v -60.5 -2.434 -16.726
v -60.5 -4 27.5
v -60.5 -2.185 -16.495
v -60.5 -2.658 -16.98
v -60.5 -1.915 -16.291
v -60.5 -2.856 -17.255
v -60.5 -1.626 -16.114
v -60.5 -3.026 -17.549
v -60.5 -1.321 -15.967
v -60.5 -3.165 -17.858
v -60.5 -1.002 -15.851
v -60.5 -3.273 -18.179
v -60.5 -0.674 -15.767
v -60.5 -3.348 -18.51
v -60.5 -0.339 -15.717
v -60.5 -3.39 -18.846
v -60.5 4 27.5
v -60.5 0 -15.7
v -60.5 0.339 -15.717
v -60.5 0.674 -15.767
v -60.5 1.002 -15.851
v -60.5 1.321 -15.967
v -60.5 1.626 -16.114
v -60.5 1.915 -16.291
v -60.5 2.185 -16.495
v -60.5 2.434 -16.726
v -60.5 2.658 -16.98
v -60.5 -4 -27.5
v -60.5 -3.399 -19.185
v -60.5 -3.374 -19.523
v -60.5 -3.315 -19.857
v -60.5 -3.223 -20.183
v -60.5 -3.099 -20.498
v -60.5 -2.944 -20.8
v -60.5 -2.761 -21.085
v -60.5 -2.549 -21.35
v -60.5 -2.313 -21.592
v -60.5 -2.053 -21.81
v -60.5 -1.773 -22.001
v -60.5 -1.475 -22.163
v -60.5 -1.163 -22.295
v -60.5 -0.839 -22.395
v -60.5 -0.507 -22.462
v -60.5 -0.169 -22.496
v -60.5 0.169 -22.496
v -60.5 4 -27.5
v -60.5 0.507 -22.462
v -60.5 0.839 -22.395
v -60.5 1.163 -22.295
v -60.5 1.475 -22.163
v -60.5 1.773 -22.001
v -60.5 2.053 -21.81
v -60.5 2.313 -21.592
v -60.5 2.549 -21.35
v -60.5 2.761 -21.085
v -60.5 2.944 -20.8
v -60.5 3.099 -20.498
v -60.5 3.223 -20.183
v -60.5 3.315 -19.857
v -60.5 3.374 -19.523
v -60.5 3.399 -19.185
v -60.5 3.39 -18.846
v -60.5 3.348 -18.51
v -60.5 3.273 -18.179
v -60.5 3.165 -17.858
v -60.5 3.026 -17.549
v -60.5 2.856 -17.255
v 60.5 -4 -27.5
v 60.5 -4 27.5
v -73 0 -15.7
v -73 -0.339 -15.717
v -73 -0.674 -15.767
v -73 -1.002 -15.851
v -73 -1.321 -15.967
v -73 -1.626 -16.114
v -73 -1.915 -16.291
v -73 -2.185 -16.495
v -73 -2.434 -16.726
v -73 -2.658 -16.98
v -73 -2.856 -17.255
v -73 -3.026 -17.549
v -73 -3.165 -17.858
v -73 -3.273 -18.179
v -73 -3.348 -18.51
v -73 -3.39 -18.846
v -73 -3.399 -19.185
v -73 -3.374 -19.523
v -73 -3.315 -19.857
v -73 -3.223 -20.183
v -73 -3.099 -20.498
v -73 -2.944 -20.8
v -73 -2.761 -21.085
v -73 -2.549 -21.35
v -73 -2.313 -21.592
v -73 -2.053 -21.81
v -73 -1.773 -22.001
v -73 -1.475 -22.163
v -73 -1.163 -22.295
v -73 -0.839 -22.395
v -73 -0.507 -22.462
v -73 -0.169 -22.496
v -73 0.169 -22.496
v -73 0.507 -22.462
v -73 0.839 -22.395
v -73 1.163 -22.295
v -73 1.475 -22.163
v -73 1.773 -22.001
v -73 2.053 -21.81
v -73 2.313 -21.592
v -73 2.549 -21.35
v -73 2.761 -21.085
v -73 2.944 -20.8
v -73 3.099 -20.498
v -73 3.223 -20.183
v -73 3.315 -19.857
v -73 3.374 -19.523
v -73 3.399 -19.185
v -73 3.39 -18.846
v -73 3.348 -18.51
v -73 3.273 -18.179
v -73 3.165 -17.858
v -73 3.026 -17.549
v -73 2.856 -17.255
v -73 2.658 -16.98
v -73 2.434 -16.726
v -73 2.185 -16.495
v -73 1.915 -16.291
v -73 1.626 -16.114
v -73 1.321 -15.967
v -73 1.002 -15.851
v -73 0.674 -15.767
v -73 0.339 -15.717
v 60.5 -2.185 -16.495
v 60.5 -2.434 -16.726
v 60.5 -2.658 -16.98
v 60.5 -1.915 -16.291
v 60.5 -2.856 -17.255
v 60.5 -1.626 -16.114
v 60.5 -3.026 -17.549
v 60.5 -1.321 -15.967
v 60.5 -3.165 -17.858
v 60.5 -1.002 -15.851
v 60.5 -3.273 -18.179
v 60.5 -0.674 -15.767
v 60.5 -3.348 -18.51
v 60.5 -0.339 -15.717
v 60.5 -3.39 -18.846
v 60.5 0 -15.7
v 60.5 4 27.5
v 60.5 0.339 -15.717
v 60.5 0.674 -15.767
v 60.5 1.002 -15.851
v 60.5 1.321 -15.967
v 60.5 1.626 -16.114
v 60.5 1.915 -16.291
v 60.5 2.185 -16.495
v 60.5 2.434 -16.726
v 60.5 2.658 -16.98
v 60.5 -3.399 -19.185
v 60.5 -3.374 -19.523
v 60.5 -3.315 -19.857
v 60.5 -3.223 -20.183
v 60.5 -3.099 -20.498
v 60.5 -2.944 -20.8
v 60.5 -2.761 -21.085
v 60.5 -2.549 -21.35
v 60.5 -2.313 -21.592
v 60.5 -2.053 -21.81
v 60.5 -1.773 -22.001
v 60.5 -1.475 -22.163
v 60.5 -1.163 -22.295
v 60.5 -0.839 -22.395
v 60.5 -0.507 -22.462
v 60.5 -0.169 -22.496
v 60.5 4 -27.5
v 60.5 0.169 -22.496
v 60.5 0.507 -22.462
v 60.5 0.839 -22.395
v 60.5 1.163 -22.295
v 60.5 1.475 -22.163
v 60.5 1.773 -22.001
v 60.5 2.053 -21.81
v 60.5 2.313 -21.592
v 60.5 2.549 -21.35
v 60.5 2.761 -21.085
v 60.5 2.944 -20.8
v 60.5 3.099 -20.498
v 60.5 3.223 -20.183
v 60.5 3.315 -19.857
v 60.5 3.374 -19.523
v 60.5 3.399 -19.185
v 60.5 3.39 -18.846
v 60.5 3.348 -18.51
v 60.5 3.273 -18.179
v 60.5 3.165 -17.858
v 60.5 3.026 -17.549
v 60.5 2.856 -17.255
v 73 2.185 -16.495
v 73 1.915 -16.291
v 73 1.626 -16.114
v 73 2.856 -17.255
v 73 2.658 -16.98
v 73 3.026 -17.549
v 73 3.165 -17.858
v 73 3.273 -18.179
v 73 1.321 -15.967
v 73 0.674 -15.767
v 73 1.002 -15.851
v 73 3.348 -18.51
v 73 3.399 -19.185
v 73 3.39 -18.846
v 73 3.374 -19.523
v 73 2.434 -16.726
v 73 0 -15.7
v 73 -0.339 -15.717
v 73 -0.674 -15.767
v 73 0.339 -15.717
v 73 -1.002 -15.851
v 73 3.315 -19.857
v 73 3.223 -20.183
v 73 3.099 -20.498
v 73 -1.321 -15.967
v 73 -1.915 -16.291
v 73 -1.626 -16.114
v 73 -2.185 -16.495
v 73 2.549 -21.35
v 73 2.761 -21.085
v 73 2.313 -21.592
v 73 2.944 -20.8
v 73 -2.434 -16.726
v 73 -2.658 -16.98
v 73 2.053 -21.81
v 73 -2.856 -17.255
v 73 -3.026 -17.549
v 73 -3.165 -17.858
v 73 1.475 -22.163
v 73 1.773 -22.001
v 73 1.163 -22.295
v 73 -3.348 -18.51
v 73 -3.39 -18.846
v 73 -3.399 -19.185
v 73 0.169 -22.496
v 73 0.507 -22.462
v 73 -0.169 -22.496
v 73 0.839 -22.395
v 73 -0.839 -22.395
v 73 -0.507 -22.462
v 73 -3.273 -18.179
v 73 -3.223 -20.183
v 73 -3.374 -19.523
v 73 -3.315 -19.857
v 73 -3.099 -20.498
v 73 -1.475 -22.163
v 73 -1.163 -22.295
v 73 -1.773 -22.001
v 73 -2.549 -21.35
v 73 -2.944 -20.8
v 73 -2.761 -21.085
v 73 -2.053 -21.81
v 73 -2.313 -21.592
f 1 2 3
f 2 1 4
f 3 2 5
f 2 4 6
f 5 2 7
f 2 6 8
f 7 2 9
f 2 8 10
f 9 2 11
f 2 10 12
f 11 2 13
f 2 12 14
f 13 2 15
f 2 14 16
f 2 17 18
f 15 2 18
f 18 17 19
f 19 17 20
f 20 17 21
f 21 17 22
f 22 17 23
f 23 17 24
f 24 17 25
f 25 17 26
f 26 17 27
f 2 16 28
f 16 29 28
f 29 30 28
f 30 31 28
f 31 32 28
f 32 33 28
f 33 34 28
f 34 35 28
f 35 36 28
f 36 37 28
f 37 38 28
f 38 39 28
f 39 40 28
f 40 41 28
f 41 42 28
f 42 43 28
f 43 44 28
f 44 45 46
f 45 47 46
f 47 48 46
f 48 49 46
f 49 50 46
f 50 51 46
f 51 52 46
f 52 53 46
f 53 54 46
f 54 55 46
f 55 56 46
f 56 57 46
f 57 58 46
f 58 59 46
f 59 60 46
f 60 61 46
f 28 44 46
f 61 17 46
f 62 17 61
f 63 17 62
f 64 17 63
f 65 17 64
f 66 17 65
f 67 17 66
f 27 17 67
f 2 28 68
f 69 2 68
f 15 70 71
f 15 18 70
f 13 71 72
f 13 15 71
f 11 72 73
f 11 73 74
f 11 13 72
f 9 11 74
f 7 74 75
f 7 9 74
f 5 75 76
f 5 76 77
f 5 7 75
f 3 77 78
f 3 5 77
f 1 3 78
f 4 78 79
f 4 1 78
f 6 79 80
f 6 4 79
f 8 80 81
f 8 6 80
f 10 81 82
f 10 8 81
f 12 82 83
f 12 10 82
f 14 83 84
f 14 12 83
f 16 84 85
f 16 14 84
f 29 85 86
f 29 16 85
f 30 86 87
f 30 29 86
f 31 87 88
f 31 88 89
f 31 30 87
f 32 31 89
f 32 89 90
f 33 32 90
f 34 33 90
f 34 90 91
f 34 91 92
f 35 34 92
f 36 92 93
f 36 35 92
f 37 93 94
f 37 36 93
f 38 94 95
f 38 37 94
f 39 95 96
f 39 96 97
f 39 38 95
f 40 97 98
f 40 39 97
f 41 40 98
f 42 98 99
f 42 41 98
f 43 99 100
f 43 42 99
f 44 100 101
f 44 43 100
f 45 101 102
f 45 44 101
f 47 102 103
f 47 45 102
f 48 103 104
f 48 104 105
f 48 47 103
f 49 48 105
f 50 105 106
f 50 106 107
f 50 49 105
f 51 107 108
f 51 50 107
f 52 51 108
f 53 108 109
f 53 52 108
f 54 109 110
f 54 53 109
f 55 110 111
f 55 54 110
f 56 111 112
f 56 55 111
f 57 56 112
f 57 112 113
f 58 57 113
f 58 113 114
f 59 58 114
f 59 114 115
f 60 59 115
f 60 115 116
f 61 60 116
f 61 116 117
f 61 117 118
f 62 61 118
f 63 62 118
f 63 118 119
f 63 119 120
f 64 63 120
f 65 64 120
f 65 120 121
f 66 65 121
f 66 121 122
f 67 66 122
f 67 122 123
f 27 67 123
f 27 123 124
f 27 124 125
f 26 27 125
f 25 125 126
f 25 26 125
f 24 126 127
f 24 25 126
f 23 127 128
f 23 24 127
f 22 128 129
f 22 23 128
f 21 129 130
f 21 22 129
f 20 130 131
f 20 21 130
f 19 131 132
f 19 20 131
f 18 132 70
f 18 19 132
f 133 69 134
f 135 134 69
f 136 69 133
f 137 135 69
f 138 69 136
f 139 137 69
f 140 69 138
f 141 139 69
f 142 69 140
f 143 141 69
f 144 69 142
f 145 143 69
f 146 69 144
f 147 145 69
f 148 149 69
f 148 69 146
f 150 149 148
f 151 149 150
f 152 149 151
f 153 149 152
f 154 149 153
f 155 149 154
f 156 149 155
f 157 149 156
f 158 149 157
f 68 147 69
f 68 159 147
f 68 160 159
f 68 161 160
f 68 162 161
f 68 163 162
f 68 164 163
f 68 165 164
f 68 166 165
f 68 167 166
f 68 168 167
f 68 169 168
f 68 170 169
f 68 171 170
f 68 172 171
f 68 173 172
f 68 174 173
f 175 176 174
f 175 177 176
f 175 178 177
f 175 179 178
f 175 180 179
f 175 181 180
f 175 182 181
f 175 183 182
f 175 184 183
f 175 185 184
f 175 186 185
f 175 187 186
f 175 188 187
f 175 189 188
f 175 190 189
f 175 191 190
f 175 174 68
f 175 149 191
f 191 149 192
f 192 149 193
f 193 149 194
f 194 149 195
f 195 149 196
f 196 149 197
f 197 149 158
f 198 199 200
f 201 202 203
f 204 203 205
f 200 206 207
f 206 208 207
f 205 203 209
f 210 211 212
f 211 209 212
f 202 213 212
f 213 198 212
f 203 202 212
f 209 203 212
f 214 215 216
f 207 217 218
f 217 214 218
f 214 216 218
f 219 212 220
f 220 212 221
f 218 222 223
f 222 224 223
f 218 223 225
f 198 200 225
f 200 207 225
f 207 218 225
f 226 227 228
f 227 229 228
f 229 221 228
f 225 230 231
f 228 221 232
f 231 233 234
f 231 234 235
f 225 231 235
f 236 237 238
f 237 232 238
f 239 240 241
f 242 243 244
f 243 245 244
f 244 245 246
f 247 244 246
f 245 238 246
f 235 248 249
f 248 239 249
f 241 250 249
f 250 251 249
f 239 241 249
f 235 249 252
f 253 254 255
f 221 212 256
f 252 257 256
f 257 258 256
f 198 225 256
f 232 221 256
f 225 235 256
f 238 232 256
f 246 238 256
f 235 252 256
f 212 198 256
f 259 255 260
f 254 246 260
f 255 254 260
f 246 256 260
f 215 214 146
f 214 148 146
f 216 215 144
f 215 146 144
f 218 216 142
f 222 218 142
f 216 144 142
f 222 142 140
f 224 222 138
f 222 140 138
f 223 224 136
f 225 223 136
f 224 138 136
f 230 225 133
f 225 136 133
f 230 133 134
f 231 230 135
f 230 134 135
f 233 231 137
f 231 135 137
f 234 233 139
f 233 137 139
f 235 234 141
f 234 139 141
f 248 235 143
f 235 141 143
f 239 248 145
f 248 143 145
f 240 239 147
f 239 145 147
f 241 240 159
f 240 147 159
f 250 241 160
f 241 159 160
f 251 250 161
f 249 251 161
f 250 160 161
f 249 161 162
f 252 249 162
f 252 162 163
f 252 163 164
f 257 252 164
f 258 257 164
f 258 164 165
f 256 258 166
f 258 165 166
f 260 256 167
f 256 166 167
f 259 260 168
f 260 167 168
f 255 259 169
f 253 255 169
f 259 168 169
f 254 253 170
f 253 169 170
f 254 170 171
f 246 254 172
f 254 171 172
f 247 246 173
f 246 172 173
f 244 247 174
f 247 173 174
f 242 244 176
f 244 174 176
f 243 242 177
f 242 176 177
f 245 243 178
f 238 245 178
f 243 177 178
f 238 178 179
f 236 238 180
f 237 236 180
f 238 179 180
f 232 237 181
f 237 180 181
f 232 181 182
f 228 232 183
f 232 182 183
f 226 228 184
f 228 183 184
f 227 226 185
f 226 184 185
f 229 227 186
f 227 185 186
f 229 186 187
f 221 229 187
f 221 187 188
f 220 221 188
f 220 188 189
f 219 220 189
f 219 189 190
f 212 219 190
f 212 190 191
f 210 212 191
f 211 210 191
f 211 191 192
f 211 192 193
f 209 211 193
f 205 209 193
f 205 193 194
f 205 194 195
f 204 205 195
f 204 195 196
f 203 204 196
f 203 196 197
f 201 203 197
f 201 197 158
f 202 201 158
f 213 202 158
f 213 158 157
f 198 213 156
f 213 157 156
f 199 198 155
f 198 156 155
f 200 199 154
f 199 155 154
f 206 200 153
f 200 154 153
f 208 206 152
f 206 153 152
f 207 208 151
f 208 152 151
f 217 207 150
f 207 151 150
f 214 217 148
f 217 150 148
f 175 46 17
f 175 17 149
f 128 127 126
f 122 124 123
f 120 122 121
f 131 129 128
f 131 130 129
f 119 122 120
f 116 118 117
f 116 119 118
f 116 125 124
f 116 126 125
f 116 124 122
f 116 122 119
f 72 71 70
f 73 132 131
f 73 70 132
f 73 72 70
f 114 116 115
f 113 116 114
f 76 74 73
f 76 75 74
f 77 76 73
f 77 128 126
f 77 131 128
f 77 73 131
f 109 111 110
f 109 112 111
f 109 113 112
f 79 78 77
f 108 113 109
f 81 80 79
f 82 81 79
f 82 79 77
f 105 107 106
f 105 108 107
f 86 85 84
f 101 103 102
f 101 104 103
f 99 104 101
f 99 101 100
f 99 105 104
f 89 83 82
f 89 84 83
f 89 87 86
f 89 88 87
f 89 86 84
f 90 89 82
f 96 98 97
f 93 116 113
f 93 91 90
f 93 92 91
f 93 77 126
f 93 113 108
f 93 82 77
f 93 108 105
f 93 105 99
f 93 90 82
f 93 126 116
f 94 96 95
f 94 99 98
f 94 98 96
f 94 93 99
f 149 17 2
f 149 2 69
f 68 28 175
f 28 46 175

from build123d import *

# Parameters (mm, degrees)
BOSS_EXTRUDE1_DEPTH = 4
SKETCH1_3_W         = 12.5
SKETCH1_3_H         = 3.4


with BuildPart() as part:
    # Sketch1 → Boss-Extrude1 (new, symmetric)
    with BuildSketch(Plane(origin=(0, 0, 0), x_dir=(1, 0, 0), z_dir=(0, 1, 0))):
        Polygon((-60.5, 27.5), (-60.5, 22.5), (-60.5, 19.1), (-60.5, 15.7), (-60.5, -27.5), (60.5, -27.5), (60.5, 27.5), align=None)
    extrude(amount=BOSS_EXTRUDE1_DEPTH, both=True)

    # Sketch1<3> → Revolve1 (revolve)
    with BuildSketch(Plane(origin=(0, 0, 0), x_dir=(1, 0, 0), z_dir=(0, 1, 0))):
        with Locations((-66.75, 20.8)):
            Rectangle(SKETCH1_3_W, SKETCH1_3_H)
    revolve1 = revolve(axis=Axis((-73, 0, -19.1), (1, 0, 0)))

    # Mirror1: Revolve1 across plane
    add(revolve1.mirror(Plane(origin=(0, 0, 0), x_dir=(0, 0, 1), z_dir=(1, 0, 0))))


solid = part.part
